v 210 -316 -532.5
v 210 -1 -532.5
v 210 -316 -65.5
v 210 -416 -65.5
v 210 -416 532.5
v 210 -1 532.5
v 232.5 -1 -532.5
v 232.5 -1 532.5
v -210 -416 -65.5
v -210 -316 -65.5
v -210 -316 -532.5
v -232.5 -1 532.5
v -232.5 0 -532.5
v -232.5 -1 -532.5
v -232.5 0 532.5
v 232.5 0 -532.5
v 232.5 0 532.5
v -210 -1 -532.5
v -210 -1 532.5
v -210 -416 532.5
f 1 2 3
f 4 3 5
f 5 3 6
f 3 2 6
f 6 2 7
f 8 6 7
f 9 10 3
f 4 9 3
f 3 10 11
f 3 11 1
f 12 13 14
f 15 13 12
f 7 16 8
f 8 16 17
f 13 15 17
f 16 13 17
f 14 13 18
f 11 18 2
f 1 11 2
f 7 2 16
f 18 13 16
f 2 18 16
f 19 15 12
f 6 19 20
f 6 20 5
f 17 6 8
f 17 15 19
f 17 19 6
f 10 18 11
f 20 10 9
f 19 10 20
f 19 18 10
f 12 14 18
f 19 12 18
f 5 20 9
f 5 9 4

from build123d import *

# Parameters (mm, degrees)
F0_W     = 465
F0_H     = 1065
F1_DEPTH = 1
F2_W     = 420
F2_H     = 1065
F3_DEPTH = 315
F4_W     = 420
F4_H     = 598
F5_DEPTH = 100


with BuildPart() as f1:
    # F0 (on Front) → F1 (new body)
    with BuildSketch(Plane.XZ):
        Rectangle(F0_W, F0_H)
    extrude(amount=F1_DEPTH)

    # F2 (on face) → F3 (join)
    with BuildSketch(Plane.XZ.offset(1)):
        Rectangle(F2_W, F2_H)
    extrude(amount=F3_DEPTH)

    # F4 (on face) → F5 (join)
    with BuildSketch(Plane.XZ.offset(316)):
        with Locations((0, 233.5)):
            Rectangle(F4_W, F4_H)
    extrude(amount=F5_DEPTH)


solid = f1.part
